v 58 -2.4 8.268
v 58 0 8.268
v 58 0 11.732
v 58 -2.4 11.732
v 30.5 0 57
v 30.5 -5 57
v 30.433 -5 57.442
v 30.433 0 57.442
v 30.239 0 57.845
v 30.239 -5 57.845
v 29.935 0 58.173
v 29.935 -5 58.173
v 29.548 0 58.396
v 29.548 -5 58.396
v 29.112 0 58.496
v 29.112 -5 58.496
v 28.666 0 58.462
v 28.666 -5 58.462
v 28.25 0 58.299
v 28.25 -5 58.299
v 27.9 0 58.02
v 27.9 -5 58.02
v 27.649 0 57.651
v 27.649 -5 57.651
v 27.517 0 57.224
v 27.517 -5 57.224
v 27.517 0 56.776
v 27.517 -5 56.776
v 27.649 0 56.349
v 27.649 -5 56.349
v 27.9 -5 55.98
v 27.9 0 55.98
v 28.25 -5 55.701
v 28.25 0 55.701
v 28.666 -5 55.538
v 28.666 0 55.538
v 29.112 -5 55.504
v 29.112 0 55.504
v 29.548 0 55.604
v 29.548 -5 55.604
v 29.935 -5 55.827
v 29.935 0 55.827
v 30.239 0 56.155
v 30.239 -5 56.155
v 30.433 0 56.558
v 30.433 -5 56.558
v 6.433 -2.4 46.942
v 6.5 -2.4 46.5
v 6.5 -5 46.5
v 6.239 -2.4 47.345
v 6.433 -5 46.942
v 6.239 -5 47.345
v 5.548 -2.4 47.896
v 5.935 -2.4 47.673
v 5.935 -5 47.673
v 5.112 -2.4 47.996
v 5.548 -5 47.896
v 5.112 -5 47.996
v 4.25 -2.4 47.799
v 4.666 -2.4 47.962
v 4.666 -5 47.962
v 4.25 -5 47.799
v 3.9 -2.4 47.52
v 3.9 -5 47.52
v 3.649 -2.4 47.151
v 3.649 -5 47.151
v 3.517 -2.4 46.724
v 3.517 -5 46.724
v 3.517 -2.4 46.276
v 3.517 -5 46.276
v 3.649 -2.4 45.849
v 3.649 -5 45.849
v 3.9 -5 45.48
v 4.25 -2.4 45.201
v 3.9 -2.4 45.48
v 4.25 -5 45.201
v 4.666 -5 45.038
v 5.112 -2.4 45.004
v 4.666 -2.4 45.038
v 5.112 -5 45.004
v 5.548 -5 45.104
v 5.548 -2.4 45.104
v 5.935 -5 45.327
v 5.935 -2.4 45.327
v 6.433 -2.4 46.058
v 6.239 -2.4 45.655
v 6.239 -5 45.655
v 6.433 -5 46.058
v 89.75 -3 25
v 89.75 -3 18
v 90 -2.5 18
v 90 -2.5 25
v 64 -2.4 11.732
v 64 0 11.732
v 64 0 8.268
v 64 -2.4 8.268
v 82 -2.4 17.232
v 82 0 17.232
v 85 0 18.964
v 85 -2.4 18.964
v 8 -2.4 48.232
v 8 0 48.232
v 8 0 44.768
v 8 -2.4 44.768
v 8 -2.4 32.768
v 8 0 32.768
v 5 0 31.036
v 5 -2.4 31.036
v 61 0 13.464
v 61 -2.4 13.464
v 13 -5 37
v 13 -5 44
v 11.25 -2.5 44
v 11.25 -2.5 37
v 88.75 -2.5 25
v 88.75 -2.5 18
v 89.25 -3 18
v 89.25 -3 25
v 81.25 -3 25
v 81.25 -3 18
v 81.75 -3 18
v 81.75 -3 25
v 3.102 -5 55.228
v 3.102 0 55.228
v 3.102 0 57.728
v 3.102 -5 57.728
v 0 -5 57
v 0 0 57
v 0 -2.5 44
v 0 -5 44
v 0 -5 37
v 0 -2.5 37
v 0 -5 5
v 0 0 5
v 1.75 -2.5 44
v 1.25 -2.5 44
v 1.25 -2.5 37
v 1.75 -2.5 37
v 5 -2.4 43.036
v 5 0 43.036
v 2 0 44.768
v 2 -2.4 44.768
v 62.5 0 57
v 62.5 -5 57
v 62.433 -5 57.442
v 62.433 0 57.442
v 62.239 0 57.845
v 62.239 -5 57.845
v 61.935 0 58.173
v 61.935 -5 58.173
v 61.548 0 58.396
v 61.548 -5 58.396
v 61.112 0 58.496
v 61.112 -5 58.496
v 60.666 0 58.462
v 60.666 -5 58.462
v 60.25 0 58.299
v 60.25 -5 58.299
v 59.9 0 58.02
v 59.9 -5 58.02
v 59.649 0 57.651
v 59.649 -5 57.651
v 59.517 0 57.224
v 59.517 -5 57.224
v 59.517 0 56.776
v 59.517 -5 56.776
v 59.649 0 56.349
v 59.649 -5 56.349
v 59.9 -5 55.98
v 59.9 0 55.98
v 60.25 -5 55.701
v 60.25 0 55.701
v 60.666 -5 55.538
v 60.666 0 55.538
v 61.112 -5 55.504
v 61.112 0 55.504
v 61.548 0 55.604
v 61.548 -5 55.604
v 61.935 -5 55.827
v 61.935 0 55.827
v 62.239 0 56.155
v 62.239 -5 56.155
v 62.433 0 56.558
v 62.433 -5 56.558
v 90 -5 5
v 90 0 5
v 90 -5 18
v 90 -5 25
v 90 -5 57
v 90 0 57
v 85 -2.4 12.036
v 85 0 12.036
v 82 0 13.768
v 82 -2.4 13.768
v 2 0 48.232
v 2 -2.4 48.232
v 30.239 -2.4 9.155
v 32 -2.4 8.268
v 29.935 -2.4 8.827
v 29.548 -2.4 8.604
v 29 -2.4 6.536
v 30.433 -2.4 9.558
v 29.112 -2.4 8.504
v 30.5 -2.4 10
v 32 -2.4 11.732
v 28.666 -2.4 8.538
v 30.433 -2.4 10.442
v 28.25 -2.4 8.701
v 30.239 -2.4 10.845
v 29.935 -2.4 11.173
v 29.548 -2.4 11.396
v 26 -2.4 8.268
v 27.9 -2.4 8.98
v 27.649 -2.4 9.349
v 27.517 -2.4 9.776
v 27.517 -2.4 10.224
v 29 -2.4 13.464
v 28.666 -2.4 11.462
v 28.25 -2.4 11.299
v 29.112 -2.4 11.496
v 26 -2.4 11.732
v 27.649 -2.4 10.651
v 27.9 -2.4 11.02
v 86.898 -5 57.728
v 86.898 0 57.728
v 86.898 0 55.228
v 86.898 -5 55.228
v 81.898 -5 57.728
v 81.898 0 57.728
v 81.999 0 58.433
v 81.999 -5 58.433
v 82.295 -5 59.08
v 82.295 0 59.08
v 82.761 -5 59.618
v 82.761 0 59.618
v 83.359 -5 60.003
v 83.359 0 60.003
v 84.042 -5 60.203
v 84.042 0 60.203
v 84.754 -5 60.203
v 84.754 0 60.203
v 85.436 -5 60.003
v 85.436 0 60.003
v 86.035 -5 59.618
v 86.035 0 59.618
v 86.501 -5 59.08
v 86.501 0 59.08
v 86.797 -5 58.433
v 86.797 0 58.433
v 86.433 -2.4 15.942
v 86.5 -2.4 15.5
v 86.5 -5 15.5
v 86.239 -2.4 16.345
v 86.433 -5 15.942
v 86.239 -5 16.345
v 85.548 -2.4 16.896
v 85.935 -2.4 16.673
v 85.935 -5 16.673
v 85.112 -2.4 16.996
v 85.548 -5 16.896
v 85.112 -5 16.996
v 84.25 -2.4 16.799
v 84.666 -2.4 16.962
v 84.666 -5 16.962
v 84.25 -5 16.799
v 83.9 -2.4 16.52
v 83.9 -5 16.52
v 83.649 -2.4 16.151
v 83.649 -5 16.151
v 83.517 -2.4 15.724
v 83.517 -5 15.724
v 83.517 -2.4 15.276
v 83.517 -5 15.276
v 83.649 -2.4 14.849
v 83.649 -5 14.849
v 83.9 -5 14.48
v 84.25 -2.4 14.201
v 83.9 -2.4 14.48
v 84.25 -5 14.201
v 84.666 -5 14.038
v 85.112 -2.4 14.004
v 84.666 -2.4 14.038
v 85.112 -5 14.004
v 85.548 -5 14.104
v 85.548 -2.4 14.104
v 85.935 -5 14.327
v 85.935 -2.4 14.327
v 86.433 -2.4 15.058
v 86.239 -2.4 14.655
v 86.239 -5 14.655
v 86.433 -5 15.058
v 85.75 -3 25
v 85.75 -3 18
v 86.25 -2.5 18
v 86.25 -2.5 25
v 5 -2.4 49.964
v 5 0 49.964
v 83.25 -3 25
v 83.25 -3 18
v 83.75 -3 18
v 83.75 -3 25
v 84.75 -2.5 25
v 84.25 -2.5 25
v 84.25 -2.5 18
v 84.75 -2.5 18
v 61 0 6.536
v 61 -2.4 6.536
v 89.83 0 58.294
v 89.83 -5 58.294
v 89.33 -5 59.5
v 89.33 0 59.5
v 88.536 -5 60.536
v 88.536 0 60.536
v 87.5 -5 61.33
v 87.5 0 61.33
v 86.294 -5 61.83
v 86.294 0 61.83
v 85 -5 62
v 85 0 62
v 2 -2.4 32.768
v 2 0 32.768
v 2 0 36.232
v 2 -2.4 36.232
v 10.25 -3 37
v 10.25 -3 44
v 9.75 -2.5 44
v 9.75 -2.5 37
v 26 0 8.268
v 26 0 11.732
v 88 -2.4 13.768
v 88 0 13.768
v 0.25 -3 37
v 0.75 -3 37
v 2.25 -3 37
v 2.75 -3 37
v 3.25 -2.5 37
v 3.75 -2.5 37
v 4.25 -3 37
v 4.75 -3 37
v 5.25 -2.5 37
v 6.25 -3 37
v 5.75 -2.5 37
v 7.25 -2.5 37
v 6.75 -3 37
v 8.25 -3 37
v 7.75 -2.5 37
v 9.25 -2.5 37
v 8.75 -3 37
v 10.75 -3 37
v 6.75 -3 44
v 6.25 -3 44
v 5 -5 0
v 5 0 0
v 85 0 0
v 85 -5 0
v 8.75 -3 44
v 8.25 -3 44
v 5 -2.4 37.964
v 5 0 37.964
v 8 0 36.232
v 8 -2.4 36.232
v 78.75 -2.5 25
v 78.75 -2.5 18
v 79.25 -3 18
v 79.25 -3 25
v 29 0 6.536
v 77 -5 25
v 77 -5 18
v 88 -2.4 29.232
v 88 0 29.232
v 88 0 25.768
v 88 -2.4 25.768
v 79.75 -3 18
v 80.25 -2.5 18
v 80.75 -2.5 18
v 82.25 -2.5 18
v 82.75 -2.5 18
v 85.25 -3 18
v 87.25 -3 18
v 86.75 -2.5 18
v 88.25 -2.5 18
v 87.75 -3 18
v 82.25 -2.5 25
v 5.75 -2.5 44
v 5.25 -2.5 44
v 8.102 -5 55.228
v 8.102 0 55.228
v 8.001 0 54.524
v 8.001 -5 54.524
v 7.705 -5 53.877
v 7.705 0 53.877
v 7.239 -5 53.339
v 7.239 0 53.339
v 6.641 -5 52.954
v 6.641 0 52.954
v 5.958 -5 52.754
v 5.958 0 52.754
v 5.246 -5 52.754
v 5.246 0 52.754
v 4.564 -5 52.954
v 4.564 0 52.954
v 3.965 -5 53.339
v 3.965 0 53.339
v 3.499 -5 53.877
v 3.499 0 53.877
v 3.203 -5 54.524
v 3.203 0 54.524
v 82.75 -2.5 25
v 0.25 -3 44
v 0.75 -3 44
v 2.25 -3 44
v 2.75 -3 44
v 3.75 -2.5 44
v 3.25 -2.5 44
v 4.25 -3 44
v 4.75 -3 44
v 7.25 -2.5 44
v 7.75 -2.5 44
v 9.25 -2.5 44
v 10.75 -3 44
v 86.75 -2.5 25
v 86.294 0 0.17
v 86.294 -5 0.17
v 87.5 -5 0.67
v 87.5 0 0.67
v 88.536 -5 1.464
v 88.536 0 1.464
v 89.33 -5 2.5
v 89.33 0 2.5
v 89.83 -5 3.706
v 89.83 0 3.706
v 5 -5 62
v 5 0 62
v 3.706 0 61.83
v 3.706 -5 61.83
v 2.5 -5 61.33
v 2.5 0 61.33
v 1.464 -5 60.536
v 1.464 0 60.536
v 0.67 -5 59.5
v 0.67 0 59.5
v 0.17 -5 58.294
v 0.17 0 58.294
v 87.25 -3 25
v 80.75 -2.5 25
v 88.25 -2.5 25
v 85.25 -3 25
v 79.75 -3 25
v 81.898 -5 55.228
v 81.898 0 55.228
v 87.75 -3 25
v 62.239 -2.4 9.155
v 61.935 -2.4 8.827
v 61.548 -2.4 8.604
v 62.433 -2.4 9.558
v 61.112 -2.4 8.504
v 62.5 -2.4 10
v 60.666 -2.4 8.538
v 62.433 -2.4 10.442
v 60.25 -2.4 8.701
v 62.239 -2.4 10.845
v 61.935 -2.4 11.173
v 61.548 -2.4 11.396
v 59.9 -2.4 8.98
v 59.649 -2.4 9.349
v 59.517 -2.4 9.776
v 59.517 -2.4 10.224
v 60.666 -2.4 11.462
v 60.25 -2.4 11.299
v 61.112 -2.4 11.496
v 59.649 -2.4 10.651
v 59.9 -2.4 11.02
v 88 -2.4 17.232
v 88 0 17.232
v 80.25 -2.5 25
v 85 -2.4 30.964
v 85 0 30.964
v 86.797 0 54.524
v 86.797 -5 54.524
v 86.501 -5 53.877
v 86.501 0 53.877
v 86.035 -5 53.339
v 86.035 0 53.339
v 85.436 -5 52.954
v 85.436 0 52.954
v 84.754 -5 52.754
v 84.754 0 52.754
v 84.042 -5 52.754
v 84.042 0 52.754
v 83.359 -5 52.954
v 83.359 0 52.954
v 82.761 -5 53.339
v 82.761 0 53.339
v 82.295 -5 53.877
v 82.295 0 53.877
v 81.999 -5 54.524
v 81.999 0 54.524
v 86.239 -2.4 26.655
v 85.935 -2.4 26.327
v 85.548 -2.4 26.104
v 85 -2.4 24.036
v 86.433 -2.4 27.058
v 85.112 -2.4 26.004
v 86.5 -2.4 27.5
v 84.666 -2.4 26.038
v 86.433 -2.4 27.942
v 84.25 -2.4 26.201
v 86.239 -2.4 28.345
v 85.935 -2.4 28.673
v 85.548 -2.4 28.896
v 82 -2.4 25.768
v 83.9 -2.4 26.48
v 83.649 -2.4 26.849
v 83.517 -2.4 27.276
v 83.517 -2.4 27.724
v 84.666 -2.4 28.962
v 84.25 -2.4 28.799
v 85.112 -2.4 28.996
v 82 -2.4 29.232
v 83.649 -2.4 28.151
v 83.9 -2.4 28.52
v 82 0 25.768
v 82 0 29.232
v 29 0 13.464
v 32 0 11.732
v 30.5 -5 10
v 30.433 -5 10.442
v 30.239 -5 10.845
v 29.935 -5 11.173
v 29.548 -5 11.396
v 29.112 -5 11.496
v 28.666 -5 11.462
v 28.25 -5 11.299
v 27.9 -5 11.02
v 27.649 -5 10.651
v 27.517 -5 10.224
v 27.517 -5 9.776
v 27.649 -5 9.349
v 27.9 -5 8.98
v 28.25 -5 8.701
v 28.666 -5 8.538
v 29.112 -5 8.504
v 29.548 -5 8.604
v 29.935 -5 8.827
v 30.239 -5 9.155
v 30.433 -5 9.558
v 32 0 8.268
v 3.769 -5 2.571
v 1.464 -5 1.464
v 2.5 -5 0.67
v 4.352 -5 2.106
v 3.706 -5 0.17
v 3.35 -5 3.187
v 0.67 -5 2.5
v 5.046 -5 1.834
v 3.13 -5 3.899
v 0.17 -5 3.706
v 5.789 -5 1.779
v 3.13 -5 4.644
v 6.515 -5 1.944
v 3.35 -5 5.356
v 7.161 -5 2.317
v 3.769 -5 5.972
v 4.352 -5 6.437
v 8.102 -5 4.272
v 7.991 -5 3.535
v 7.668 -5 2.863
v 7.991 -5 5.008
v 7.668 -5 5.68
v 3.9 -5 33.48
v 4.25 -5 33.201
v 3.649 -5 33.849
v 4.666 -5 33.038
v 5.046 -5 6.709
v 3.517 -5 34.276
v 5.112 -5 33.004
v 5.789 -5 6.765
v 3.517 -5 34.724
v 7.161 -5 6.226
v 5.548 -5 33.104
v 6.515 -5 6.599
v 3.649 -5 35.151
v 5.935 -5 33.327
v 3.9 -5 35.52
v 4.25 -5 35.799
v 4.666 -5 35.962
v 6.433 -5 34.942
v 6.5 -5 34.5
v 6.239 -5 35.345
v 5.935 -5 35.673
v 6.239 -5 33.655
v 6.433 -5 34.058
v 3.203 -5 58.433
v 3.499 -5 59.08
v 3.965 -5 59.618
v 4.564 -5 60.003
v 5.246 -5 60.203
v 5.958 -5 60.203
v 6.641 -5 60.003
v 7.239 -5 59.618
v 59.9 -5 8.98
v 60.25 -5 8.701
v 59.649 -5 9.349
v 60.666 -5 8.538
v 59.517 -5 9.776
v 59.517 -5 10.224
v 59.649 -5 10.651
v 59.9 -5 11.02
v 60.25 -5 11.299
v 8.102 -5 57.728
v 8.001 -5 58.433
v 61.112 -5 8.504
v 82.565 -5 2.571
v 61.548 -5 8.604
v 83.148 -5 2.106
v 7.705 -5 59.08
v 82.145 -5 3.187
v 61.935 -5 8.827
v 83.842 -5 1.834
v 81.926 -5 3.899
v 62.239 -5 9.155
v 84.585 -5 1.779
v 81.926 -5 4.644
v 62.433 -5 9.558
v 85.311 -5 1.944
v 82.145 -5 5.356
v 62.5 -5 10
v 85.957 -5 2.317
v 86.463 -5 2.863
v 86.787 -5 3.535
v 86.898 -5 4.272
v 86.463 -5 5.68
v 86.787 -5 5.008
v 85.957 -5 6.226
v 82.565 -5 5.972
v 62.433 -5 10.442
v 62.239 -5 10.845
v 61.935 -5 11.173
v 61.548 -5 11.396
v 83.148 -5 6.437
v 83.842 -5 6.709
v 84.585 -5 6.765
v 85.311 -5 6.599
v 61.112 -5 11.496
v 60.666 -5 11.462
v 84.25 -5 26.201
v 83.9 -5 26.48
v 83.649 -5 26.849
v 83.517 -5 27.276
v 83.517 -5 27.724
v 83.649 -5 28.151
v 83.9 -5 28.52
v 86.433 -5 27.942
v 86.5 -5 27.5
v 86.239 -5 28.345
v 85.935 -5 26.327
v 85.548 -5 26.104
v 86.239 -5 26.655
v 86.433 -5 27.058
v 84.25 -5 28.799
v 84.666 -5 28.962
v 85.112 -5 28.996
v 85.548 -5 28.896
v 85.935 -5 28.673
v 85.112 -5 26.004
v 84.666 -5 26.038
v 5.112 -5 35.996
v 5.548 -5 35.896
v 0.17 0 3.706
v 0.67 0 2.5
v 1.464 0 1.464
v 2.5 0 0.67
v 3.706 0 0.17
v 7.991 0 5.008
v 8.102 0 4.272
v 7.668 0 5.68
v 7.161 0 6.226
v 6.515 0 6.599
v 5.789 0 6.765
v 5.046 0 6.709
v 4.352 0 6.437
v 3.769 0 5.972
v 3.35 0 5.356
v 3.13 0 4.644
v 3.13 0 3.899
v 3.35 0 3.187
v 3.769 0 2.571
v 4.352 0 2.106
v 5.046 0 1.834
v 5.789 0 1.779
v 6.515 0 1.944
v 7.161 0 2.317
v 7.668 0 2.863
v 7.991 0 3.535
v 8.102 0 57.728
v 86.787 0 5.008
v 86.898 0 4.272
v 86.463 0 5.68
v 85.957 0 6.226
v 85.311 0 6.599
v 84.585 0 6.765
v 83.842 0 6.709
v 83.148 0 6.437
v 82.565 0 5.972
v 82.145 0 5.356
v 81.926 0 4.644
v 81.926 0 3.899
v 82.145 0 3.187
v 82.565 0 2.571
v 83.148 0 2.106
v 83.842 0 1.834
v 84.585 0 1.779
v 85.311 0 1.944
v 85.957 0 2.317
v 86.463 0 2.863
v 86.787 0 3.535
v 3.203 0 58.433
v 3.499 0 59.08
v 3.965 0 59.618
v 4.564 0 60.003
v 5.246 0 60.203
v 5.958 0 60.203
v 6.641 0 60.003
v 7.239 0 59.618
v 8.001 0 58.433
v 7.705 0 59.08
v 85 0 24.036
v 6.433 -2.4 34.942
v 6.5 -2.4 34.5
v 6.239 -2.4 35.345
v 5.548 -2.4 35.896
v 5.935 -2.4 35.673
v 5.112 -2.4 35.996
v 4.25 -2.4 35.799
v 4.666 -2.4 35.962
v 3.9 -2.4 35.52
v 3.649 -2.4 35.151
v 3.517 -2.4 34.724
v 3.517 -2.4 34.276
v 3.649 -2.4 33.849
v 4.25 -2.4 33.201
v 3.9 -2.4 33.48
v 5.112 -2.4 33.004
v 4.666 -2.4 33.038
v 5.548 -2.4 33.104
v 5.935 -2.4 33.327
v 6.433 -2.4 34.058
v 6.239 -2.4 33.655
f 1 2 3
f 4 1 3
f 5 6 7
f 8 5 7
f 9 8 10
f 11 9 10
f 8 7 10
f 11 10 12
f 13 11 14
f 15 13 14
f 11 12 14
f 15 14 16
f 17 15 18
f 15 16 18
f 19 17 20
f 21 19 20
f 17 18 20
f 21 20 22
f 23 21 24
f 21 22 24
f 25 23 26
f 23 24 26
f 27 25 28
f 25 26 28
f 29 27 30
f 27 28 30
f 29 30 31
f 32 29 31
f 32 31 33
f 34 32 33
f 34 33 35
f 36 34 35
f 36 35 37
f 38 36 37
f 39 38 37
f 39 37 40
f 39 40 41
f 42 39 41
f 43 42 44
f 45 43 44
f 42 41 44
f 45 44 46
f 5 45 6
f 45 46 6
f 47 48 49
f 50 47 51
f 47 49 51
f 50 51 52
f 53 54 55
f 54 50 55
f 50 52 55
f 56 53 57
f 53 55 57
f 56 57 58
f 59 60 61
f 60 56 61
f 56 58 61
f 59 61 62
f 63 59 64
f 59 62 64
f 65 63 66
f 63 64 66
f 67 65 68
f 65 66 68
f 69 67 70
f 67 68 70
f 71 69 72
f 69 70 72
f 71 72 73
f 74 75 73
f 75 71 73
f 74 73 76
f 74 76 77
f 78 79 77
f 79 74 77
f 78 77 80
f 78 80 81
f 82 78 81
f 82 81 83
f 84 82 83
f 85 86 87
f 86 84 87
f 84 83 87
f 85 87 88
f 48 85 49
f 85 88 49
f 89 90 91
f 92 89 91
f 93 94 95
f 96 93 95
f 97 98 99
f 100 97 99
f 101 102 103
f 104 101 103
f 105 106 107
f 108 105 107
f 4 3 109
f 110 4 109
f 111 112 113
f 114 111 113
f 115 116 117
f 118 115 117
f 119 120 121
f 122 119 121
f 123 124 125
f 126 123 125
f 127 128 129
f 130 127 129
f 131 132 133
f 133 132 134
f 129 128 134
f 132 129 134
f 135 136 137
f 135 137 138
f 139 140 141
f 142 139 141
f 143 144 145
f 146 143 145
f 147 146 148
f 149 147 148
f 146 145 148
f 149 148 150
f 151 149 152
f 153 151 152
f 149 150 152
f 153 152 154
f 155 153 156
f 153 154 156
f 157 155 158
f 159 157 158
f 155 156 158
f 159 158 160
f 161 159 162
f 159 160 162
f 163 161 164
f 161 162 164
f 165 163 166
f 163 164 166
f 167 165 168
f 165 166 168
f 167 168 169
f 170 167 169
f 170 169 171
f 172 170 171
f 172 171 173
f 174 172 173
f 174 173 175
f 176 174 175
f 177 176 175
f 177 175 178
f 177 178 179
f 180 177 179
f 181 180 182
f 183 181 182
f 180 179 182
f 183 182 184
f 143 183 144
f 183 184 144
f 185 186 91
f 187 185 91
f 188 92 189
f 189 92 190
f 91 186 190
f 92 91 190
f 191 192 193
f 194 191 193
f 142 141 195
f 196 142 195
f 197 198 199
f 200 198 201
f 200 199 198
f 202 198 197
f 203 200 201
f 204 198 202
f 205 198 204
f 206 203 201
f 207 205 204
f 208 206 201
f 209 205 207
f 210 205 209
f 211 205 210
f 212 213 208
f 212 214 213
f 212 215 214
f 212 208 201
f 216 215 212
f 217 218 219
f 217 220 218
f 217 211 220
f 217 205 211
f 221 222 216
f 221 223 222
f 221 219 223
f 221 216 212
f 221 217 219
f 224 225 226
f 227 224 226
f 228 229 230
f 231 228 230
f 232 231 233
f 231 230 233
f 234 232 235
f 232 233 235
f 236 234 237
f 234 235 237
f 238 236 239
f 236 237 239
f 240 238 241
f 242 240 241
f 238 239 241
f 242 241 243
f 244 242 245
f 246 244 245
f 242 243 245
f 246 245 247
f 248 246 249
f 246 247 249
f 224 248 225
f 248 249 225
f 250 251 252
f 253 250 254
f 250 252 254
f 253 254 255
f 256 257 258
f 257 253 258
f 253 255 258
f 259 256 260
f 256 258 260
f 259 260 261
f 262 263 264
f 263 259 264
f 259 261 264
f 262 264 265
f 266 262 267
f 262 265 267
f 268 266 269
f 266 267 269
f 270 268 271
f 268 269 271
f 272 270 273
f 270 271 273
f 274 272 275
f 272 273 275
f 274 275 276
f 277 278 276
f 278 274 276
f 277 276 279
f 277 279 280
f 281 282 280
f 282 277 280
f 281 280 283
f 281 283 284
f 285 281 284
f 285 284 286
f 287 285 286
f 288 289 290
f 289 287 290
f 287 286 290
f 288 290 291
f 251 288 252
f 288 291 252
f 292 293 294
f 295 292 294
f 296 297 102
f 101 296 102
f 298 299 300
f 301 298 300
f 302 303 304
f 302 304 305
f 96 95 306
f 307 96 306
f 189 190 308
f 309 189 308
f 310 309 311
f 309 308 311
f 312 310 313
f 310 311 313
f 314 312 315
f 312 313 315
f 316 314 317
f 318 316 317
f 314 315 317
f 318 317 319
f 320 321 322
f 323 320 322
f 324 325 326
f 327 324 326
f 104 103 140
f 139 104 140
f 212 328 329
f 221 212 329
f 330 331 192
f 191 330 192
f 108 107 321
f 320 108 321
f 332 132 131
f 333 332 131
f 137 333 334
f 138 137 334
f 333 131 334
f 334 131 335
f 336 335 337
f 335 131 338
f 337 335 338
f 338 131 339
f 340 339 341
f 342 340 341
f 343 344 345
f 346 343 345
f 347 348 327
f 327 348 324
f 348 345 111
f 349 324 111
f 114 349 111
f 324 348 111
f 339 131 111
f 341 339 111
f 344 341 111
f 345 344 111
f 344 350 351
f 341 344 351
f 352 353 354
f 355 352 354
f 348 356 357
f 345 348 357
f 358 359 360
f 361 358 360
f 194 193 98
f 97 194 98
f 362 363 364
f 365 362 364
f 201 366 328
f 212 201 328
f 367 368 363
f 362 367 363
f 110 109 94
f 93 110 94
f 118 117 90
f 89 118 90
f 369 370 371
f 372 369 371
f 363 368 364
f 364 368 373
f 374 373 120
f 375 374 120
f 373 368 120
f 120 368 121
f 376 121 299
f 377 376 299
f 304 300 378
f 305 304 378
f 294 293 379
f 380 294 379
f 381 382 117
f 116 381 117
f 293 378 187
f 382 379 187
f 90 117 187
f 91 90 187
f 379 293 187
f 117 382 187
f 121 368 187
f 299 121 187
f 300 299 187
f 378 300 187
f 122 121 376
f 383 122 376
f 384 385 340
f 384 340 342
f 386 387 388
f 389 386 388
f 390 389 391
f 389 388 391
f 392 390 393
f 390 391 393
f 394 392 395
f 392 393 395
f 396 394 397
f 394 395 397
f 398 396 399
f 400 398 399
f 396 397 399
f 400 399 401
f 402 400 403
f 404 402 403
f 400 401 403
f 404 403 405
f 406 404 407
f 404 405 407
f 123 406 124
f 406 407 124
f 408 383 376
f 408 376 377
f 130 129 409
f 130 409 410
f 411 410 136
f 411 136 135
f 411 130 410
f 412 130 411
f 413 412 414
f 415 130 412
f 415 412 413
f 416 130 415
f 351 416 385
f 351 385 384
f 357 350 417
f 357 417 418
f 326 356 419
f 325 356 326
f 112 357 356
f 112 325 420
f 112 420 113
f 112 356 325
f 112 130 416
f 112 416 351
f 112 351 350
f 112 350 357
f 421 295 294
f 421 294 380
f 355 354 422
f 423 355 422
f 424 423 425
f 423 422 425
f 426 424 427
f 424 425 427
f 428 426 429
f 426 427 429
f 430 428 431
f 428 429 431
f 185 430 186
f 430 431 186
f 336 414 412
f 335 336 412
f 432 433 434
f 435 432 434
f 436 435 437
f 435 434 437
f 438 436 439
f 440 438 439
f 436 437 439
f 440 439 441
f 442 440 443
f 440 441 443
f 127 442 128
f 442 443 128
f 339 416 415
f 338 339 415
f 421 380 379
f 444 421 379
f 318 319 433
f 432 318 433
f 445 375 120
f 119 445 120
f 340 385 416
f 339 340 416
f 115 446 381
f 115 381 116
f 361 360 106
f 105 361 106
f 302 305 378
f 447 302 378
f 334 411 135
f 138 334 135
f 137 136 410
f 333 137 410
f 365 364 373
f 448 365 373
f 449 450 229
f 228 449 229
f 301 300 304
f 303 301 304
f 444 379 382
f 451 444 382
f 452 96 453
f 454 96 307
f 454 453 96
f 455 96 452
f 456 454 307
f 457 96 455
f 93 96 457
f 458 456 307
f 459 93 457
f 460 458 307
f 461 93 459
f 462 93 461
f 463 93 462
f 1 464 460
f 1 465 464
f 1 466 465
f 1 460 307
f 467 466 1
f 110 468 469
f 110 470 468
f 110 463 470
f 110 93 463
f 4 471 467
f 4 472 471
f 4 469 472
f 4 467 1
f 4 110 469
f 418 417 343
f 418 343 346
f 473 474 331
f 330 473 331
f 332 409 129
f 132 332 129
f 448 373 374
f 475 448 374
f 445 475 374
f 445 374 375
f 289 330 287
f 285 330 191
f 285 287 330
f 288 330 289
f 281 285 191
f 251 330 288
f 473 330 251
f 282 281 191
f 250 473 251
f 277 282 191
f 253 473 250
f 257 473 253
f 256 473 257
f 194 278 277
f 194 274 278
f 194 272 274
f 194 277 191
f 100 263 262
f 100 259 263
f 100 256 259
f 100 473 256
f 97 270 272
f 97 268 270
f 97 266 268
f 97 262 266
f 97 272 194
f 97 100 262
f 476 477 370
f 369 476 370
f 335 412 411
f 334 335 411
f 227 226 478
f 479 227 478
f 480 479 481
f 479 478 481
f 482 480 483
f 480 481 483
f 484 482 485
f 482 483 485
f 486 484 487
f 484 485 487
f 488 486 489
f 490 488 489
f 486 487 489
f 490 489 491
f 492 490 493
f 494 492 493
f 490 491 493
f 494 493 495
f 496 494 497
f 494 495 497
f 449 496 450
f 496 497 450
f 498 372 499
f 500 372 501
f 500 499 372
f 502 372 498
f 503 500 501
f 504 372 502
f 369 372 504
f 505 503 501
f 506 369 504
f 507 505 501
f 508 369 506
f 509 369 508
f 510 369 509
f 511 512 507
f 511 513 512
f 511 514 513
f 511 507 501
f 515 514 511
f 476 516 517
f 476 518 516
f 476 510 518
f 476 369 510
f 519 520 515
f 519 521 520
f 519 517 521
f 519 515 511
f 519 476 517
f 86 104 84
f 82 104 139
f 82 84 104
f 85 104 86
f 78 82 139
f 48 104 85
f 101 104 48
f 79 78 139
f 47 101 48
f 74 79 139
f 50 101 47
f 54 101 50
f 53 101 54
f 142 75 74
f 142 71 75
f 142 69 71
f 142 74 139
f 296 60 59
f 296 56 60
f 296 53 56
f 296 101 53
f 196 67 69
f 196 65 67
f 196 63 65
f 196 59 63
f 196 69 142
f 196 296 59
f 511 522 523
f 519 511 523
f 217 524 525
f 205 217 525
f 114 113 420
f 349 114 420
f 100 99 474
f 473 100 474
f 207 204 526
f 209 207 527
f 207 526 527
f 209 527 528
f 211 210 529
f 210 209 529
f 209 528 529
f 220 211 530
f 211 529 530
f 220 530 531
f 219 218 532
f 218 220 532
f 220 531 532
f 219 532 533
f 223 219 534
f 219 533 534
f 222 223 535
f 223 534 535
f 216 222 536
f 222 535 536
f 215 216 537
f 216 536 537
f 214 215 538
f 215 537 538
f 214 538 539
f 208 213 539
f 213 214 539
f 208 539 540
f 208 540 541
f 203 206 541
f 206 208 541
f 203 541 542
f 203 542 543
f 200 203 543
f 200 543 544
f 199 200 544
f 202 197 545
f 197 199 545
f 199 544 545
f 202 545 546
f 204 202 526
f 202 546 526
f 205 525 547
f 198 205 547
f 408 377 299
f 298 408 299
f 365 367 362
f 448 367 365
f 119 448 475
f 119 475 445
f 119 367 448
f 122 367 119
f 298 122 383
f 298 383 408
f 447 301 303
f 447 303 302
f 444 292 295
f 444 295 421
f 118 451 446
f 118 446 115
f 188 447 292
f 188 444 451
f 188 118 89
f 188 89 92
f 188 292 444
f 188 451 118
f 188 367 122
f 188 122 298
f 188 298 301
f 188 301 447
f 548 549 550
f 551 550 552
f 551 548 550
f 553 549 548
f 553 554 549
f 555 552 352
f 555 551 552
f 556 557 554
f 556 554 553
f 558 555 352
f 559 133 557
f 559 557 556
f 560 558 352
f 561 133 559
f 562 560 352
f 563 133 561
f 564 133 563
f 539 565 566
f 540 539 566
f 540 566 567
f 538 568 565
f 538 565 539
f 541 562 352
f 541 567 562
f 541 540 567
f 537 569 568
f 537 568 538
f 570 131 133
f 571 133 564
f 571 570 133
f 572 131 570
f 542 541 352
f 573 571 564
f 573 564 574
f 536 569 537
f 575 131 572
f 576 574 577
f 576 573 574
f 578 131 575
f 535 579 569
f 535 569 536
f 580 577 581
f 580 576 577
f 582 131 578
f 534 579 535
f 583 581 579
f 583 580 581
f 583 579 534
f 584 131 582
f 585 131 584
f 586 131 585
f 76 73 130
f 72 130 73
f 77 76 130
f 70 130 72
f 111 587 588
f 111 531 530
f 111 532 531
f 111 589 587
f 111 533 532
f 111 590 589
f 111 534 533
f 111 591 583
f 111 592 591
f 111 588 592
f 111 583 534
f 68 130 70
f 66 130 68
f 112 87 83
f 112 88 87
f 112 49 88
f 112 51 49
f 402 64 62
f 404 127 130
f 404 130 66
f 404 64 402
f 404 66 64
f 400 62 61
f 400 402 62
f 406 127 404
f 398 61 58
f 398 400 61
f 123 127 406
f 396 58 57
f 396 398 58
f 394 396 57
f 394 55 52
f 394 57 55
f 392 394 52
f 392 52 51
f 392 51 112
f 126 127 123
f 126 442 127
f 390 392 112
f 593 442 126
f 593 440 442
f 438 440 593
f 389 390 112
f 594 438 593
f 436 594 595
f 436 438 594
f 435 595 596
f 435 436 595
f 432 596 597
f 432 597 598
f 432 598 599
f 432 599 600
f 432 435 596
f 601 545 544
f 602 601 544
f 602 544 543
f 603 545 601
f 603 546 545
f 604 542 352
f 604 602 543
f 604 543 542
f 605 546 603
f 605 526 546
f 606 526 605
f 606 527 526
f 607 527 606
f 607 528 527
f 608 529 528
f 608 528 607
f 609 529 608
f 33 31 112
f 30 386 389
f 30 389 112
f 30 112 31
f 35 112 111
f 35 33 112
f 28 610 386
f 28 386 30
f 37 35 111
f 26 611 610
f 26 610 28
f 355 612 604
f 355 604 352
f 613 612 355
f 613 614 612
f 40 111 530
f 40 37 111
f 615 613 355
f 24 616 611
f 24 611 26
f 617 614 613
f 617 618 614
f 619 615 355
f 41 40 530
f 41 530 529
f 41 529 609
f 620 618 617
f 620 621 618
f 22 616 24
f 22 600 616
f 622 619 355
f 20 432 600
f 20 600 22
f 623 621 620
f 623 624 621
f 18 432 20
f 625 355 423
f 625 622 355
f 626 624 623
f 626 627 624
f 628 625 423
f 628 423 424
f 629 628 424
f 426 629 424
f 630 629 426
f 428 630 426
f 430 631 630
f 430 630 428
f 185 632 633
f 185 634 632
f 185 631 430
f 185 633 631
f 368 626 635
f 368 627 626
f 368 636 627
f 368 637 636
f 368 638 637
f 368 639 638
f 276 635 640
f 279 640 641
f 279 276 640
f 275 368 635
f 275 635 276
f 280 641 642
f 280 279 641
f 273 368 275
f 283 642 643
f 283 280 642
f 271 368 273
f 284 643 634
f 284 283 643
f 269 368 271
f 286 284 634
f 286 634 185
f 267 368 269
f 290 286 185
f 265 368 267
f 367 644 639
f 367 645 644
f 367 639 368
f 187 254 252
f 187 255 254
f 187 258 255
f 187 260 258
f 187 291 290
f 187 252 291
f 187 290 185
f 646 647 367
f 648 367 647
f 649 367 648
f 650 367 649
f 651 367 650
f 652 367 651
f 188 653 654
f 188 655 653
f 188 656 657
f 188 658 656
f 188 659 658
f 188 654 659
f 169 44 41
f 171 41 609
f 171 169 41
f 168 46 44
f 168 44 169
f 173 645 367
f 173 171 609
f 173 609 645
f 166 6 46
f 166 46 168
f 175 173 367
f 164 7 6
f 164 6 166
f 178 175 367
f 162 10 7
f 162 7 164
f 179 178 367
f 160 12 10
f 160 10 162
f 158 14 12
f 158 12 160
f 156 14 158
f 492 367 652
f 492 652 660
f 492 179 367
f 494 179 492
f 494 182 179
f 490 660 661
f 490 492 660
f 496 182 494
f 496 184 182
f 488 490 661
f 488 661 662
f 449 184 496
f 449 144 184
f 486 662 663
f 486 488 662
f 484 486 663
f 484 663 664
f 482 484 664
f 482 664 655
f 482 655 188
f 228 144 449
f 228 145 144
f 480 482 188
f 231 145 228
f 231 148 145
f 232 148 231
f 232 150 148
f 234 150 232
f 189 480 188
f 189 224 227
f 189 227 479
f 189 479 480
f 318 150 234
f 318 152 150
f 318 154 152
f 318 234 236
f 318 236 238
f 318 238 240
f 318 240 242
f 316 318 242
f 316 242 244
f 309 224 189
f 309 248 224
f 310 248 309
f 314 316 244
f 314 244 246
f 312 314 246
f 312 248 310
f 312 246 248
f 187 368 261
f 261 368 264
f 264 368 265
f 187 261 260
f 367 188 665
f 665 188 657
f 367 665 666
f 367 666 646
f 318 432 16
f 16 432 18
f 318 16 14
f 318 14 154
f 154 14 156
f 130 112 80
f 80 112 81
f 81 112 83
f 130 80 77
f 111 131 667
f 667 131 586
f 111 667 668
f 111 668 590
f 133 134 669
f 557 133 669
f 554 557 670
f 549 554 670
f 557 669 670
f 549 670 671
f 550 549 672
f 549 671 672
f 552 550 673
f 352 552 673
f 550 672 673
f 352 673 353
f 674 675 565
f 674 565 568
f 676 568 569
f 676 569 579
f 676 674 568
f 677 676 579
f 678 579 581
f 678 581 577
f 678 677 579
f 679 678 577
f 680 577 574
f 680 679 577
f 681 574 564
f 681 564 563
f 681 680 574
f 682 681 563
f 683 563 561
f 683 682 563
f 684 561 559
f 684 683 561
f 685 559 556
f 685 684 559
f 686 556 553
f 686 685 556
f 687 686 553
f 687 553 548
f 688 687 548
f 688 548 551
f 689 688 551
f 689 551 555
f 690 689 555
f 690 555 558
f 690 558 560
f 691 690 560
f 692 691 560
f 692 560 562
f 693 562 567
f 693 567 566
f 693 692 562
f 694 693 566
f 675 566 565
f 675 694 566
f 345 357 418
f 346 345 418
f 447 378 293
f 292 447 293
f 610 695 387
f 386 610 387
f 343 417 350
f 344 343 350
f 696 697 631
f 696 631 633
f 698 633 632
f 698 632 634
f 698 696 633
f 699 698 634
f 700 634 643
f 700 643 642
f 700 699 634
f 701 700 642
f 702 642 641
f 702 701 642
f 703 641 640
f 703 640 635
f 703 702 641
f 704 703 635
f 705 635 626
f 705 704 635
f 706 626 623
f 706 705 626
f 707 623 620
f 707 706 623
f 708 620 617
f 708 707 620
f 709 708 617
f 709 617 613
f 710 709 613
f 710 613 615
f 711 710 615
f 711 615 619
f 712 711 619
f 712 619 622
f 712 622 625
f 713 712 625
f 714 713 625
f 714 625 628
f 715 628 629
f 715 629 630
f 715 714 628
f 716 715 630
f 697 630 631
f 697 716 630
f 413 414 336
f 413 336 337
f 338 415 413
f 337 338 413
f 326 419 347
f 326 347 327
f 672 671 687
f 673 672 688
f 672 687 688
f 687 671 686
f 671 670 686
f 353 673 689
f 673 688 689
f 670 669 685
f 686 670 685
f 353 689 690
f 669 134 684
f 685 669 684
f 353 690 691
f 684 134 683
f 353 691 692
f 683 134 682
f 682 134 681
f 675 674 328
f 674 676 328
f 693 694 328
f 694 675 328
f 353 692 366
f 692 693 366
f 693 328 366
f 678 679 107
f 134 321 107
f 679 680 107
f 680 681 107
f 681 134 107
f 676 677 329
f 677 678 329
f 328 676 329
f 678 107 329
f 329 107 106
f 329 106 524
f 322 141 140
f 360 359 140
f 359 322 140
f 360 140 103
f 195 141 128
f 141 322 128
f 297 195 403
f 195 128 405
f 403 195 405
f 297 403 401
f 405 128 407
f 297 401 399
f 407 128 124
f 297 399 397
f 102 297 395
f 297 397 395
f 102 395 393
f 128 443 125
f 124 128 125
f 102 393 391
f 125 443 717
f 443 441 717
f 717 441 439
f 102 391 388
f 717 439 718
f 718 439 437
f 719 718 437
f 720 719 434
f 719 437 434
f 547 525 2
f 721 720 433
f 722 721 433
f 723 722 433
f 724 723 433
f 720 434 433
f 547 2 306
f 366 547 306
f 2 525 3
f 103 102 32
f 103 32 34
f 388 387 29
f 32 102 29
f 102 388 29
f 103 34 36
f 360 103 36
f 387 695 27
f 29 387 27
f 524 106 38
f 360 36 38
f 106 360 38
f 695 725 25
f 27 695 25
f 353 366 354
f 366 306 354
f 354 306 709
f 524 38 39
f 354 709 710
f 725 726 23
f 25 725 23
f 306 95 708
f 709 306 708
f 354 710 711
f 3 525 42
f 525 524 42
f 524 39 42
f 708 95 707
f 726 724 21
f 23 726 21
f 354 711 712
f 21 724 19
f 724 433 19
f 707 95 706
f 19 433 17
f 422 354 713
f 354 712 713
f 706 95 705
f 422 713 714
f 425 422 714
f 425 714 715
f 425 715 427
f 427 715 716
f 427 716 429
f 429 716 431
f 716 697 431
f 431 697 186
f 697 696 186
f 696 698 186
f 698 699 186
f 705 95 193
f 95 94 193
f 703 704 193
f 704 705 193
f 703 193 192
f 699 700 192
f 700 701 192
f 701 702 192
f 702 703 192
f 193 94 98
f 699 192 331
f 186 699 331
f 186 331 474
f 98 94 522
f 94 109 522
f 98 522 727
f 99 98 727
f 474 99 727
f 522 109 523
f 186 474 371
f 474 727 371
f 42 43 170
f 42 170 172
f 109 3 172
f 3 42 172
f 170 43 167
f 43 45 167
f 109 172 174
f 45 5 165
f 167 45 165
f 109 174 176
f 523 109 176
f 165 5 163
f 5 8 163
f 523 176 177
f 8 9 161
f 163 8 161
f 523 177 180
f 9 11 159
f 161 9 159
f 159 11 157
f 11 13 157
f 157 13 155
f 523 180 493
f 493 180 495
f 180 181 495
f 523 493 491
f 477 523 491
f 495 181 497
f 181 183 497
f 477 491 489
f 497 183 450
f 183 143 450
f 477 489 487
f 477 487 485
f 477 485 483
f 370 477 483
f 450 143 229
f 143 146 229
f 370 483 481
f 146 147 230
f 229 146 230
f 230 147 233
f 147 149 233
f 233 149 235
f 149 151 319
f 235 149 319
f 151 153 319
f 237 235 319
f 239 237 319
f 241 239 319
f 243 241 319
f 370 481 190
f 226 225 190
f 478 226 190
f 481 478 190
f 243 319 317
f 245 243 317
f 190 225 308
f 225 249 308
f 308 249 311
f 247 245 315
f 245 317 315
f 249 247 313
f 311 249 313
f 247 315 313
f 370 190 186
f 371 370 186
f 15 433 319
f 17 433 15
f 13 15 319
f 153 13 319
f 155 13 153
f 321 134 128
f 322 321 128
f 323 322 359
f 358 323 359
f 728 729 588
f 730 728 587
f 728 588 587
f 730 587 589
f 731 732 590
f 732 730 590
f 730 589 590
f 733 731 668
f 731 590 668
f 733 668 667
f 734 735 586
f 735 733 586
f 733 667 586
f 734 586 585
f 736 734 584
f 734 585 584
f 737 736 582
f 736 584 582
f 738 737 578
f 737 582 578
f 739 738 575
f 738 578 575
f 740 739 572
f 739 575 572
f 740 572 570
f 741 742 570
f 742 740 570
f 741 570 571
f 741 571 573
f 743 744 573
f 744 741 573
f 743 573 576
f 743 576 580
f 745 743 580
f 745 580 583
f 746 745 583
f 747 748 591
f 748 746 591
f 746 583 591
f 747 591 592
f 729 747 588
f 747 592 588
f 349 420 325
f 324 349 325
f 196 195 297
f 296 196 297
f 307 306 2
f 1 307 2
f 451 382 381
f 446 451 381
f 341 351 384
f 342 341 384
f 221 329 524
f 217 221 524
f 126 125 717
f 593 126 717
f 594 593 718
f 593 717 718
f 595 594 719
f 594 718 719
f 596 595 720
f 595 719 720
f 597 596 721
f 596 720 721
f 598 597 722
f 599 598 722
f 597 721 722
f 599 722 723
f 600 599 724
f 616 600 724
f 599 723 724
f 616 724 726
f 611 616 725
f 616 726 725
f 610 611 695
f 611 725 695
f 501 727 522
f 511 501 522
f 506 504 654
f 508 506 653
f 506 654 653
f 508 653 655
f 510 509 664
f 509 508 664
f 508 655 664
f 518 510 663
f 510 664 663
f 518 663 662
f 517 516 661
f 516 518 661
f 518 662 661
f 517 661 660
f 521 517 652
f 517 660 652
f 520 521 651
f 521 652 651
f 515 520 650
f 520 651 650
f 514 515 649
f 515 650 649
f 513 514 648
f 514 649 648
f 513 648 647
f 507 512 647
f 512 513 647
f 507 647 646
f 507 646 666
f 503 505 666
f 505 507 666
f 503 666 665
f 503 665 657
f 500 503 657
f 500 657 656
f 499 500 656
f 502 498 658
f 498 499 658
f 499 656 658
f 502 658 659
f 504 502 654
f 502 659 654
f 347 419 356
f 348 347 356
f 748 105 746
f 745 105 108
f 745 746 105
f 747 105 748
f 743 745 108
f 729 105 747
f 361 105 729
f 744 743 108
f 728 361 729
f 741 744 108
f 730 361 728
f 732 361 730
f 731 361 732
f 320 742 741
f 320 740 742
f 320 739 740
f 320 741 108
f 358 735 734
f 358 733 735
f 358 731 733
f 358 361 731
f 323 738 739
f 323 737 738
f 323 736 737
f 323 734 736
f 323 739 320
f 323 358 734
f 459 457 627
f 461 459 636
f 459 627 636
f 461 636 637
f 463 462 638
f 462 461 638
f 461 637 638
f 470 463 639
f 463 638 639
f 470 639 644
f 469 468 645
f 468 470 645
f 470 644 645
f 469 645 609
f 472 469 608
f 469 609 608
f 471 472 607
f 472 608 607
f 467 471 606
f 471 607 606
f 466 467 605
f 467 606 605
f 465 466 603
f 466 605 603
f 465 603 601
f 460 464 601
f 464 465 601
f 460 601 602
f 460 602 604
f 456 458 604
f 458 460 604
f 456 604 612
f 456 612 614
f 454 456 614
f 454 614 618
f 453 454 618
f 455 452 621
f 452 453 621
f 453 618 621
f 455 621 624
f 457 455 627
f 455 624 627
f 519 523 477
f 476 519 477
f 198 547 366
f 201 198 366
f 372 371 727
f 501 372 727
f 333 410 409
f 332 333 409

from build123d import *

# Parameters (mm, degrees)
F0_R      = 2.5
F1_DEPTH  = 5
F2_W      = 13
F2_H      = 7
F3_DEPTH  = 2.5
F5_DEPTH  = 7
F7_DEPTH  = 7
F8_R      = 1.5
F9_DEPTH  = 5
F10_R     = 1.5
F11_DEPTH = 2.4
F12_R     = 1.5
F13_DEPTH = 5
F14_R     = 1.5
F15_DEPTH = 2.4


with BuildPart() as f1:
    # F0 (on Front) → F1 (new body)
    with BuildSketch(Plane.XZ):
        with BuildLine():
            ThreePointArc((0, 5), (1.464466, 1.464466), (5, 0))
            Line((5, 0), (85, 0))
            ThreePointArc((85, 0), (88.535534, 1.464466), (90, 5))
            Line((90, 5), (90, 57))
            ThreePointArc((90, 57), (88.535534, 60.535534), (85, 62))
            Line((85, 62), (5, 62))
            ThreePointArc((5, 62), (1.464466, 60.535534), (0, 57))
            Line((0, 57), (0, 5))
        make_face()
        with Locations((5.602129, 4.271554)):
            Circle(F0_R, mode=Mode.SUBTRACT)
        with Locations((84.397871, 4.271554)):
            Circle(F0_R, mode=Mode.SUBTRACT)
        with BuildLine():
            Line((3.102129, 55.228446), (3.102129, 57.728446))
            ThreePointArc((3.102129, 57.728446), (5.602129, 60.228446), (8.102129, 57.728446))
            Line((8.102129, 57.728446), (8.102129, 55.228446))
            ThreePointArc((8.102129, 55.228446), (5.602129, 52.728446), (3.102129, 55.228446))
        make_face(mode=Mode.SUBTRACT)
        with BuildLine():
            ThreePointArc((81.897871, 57.728446), (84.397871, 60.228446), (86.897871, 57.728446))
            Line((86.897871, 57.728446), (86.897871, 55.228446))
            ThreePointArc((86.897871, 55.228446), (84.397871, 52.728446), (81.897871, 55.228446))
            Line((81.897871, 55.228446), (81.897871, 57.728446))
        make_face(mode=Mode.SUBTRACT)
    extrude(amount=F1_DEPTH)

    # F2 (on face) → F3 (cut)
    with BuildSketch(Plane.XZ.offset(5)):
        with Locations((6.5, 40.5)):
            Rectangle(F2_W, F2_H)
        with Locations((83.5, 21.5)):
            Rectangle(F2_W, F2_H)
    extrude(amount=-F3_DEPTH, mode=Mode.SUBTRACT)

    # F4 (on face) → F5 (join, through all)
    with BuildSketch(Plane(origin=(0, 0, 44), x_dir=(1, 0, 0), z_dir=(0, 0, -1))):
        Polygon((13, 2.5), (13, 5), (11.25, 2.5), align=None)
        Polygon((7.75, 2.5), (9.25, 2.5), (8.75, 3), (8.25, 3), align=None)
        Polygon((9.75, 2.5), (11.25, 2.5), (10.75, 3), (10.25, 3), align=None)
        Polygon((6.25, 3), (5.75, 2.5), (7.25, 2.5), (6.75, 3), align=None)
        Polygon((4.25, 3), (3.75, 2.5), (5.25, 2.5), (4.75, 3), align=None)
        Polygon((2.25, 3), (1.75, 2.5), (3.25, 2.5), (2.75, 3), align=None)
        Polygon((0.25, 3), (0, 2.5), (1.25, 2.5), (0.75, 3), align=None)
    extrude(amount=F5_DEPTH)

    # F6 (on face) → F7 (join, through all)
    with BuildSketch(Plane.XY.offset(18)):
        Polygon((77, -2.5), (77, -5), (78.75, -2.5), align=None)
        Polygon((80.25, -2.5), (78.75, -2.5), (79.25, -3), (79.75, -3), align=None)
        Polygon((82.25, -2.5), (80.75, -2.5), (81.25, -3), (81.75, -3), align=None)
        Polygon((83.75, -3), (84.25, -2.5), (82.75, -2.5), (83.25, -3), align=None)
        Polygon((85.75, -3), (86.25, -2.5), (84.75, -2.5), (85.25, -3), align=None)
        Polygon((87.75, -3), (88.25, -2.5), (86.75, -2.5), (87.25, -3), align=None)
        Polygon((89.75, -3), (90, -2.5), (88.75, -2.5), (89.25, -3), align=None)
    extrude(amount=F7_DEPTH)

    # F8 (on face) → F9 (cut)
    with BuildSketch(Plane.XZ.offset(5)):
        with Locations((5, 46.5)):
            Circle(F8_R)
        with Locations((5, 34.5)):
            Circle(F8_R)
        with Locations((85, 27.5)):
            Circle(F8_R)
        with Locations((85, 15.5)):
            Circle(F8_R)
    extrude(amount=-F9_DEPTH, mode=Mode.SUBTRACT)

    # F10 (on face) → F11 (cut)
    with BuildSketch(Plane(origin=(0, 0, 0), x_dir=(-1, 0, 0), z_dir=(0, 1, 0))):
        Polygon((-82, 25.767949), (-82, 29.232051), (-85, 30.964102), (-88, 29.232051), (-88, 25.767949), (-85, 24.035898), align=None)
        with Locations((-85, 27.5)):
            Circle(F10_R, mode=Mode.SUBTRACT)
        Polygon((-82, 13.767949), (-82, 17.232051), (-85, 18.964102), (-88, 17.232051), (-88, 13.767949), (-85, 12.035898), align=None)
        with Locations((-85, 15.5)):
            Circle(F10_R, mode=Mode.SUBTRACT)
        Polygon((-8, 36.232051), (-8, 32.767949), (-5, 31.035898), (-2, 32.767949), (-2, 36.232051), (-5, 37.964102), align=None)
        with Locations((-5, 34.5)):
            Circle(F10_R, mode=Mode.SUBTRACT)
        Polygon((-8, 48.232051), (-8, 44.767949), (-5, 43.035898), (-2, 44.767949), (-2, 48.232051), (-5, 49.964102), align=None)
        with Locations((-5, 46.5)):
            Circle(F10_R, mode=Mode.SUBTRACT)
    extrude(amount=-F11_DEPTH, mode=Mode.SUBTRACT)

    # F12 (on face) → F13 (cut)
    with BuildSketch(Plane.XZ.offset(5)):
        with Locations((61, 57)):
            Circle(F12_R)
        with Locations((29, 57)):
            Circle(F12_R)
        with Locations((29, 10)):
            Circle(F12_R)
        with Locations((61, 10)):
            Circle(F12_R)
    extrude(amount=-F13_DEPTH, mode=Mode.SUBTRACT)

    # F14 (on face) → F15 (cut)
    with BuildSketch(Plane(origin=(0, 0, 0), x_dir=(-1, 0, 0), z_dir=(0, 1, 0))):
        Polygon((-58, 8.267949), (-58, 11.732051), (-61, 13.464102), (-64, 11.732051), (-64, 8.267949), (-61, 6.535898), align=None)
        with Locations((-61, 10)):
            Circle(F14_R, mode=Mode.SUBTRACT)
        Polygon((-32, 11.732051), (-32, 8.267949), (-29, 6.535898), (-26, 8.267949), (-26, 11.732051), (-29, 13.464102), align=None)
        with Locations((-29, 10)):
            Circle(F14_R, mode=Mode.SUBTRACT)
    extrude(amount=-F15_DEPTH, mode=Mode.SUBTRACT)


solid = f1.part
